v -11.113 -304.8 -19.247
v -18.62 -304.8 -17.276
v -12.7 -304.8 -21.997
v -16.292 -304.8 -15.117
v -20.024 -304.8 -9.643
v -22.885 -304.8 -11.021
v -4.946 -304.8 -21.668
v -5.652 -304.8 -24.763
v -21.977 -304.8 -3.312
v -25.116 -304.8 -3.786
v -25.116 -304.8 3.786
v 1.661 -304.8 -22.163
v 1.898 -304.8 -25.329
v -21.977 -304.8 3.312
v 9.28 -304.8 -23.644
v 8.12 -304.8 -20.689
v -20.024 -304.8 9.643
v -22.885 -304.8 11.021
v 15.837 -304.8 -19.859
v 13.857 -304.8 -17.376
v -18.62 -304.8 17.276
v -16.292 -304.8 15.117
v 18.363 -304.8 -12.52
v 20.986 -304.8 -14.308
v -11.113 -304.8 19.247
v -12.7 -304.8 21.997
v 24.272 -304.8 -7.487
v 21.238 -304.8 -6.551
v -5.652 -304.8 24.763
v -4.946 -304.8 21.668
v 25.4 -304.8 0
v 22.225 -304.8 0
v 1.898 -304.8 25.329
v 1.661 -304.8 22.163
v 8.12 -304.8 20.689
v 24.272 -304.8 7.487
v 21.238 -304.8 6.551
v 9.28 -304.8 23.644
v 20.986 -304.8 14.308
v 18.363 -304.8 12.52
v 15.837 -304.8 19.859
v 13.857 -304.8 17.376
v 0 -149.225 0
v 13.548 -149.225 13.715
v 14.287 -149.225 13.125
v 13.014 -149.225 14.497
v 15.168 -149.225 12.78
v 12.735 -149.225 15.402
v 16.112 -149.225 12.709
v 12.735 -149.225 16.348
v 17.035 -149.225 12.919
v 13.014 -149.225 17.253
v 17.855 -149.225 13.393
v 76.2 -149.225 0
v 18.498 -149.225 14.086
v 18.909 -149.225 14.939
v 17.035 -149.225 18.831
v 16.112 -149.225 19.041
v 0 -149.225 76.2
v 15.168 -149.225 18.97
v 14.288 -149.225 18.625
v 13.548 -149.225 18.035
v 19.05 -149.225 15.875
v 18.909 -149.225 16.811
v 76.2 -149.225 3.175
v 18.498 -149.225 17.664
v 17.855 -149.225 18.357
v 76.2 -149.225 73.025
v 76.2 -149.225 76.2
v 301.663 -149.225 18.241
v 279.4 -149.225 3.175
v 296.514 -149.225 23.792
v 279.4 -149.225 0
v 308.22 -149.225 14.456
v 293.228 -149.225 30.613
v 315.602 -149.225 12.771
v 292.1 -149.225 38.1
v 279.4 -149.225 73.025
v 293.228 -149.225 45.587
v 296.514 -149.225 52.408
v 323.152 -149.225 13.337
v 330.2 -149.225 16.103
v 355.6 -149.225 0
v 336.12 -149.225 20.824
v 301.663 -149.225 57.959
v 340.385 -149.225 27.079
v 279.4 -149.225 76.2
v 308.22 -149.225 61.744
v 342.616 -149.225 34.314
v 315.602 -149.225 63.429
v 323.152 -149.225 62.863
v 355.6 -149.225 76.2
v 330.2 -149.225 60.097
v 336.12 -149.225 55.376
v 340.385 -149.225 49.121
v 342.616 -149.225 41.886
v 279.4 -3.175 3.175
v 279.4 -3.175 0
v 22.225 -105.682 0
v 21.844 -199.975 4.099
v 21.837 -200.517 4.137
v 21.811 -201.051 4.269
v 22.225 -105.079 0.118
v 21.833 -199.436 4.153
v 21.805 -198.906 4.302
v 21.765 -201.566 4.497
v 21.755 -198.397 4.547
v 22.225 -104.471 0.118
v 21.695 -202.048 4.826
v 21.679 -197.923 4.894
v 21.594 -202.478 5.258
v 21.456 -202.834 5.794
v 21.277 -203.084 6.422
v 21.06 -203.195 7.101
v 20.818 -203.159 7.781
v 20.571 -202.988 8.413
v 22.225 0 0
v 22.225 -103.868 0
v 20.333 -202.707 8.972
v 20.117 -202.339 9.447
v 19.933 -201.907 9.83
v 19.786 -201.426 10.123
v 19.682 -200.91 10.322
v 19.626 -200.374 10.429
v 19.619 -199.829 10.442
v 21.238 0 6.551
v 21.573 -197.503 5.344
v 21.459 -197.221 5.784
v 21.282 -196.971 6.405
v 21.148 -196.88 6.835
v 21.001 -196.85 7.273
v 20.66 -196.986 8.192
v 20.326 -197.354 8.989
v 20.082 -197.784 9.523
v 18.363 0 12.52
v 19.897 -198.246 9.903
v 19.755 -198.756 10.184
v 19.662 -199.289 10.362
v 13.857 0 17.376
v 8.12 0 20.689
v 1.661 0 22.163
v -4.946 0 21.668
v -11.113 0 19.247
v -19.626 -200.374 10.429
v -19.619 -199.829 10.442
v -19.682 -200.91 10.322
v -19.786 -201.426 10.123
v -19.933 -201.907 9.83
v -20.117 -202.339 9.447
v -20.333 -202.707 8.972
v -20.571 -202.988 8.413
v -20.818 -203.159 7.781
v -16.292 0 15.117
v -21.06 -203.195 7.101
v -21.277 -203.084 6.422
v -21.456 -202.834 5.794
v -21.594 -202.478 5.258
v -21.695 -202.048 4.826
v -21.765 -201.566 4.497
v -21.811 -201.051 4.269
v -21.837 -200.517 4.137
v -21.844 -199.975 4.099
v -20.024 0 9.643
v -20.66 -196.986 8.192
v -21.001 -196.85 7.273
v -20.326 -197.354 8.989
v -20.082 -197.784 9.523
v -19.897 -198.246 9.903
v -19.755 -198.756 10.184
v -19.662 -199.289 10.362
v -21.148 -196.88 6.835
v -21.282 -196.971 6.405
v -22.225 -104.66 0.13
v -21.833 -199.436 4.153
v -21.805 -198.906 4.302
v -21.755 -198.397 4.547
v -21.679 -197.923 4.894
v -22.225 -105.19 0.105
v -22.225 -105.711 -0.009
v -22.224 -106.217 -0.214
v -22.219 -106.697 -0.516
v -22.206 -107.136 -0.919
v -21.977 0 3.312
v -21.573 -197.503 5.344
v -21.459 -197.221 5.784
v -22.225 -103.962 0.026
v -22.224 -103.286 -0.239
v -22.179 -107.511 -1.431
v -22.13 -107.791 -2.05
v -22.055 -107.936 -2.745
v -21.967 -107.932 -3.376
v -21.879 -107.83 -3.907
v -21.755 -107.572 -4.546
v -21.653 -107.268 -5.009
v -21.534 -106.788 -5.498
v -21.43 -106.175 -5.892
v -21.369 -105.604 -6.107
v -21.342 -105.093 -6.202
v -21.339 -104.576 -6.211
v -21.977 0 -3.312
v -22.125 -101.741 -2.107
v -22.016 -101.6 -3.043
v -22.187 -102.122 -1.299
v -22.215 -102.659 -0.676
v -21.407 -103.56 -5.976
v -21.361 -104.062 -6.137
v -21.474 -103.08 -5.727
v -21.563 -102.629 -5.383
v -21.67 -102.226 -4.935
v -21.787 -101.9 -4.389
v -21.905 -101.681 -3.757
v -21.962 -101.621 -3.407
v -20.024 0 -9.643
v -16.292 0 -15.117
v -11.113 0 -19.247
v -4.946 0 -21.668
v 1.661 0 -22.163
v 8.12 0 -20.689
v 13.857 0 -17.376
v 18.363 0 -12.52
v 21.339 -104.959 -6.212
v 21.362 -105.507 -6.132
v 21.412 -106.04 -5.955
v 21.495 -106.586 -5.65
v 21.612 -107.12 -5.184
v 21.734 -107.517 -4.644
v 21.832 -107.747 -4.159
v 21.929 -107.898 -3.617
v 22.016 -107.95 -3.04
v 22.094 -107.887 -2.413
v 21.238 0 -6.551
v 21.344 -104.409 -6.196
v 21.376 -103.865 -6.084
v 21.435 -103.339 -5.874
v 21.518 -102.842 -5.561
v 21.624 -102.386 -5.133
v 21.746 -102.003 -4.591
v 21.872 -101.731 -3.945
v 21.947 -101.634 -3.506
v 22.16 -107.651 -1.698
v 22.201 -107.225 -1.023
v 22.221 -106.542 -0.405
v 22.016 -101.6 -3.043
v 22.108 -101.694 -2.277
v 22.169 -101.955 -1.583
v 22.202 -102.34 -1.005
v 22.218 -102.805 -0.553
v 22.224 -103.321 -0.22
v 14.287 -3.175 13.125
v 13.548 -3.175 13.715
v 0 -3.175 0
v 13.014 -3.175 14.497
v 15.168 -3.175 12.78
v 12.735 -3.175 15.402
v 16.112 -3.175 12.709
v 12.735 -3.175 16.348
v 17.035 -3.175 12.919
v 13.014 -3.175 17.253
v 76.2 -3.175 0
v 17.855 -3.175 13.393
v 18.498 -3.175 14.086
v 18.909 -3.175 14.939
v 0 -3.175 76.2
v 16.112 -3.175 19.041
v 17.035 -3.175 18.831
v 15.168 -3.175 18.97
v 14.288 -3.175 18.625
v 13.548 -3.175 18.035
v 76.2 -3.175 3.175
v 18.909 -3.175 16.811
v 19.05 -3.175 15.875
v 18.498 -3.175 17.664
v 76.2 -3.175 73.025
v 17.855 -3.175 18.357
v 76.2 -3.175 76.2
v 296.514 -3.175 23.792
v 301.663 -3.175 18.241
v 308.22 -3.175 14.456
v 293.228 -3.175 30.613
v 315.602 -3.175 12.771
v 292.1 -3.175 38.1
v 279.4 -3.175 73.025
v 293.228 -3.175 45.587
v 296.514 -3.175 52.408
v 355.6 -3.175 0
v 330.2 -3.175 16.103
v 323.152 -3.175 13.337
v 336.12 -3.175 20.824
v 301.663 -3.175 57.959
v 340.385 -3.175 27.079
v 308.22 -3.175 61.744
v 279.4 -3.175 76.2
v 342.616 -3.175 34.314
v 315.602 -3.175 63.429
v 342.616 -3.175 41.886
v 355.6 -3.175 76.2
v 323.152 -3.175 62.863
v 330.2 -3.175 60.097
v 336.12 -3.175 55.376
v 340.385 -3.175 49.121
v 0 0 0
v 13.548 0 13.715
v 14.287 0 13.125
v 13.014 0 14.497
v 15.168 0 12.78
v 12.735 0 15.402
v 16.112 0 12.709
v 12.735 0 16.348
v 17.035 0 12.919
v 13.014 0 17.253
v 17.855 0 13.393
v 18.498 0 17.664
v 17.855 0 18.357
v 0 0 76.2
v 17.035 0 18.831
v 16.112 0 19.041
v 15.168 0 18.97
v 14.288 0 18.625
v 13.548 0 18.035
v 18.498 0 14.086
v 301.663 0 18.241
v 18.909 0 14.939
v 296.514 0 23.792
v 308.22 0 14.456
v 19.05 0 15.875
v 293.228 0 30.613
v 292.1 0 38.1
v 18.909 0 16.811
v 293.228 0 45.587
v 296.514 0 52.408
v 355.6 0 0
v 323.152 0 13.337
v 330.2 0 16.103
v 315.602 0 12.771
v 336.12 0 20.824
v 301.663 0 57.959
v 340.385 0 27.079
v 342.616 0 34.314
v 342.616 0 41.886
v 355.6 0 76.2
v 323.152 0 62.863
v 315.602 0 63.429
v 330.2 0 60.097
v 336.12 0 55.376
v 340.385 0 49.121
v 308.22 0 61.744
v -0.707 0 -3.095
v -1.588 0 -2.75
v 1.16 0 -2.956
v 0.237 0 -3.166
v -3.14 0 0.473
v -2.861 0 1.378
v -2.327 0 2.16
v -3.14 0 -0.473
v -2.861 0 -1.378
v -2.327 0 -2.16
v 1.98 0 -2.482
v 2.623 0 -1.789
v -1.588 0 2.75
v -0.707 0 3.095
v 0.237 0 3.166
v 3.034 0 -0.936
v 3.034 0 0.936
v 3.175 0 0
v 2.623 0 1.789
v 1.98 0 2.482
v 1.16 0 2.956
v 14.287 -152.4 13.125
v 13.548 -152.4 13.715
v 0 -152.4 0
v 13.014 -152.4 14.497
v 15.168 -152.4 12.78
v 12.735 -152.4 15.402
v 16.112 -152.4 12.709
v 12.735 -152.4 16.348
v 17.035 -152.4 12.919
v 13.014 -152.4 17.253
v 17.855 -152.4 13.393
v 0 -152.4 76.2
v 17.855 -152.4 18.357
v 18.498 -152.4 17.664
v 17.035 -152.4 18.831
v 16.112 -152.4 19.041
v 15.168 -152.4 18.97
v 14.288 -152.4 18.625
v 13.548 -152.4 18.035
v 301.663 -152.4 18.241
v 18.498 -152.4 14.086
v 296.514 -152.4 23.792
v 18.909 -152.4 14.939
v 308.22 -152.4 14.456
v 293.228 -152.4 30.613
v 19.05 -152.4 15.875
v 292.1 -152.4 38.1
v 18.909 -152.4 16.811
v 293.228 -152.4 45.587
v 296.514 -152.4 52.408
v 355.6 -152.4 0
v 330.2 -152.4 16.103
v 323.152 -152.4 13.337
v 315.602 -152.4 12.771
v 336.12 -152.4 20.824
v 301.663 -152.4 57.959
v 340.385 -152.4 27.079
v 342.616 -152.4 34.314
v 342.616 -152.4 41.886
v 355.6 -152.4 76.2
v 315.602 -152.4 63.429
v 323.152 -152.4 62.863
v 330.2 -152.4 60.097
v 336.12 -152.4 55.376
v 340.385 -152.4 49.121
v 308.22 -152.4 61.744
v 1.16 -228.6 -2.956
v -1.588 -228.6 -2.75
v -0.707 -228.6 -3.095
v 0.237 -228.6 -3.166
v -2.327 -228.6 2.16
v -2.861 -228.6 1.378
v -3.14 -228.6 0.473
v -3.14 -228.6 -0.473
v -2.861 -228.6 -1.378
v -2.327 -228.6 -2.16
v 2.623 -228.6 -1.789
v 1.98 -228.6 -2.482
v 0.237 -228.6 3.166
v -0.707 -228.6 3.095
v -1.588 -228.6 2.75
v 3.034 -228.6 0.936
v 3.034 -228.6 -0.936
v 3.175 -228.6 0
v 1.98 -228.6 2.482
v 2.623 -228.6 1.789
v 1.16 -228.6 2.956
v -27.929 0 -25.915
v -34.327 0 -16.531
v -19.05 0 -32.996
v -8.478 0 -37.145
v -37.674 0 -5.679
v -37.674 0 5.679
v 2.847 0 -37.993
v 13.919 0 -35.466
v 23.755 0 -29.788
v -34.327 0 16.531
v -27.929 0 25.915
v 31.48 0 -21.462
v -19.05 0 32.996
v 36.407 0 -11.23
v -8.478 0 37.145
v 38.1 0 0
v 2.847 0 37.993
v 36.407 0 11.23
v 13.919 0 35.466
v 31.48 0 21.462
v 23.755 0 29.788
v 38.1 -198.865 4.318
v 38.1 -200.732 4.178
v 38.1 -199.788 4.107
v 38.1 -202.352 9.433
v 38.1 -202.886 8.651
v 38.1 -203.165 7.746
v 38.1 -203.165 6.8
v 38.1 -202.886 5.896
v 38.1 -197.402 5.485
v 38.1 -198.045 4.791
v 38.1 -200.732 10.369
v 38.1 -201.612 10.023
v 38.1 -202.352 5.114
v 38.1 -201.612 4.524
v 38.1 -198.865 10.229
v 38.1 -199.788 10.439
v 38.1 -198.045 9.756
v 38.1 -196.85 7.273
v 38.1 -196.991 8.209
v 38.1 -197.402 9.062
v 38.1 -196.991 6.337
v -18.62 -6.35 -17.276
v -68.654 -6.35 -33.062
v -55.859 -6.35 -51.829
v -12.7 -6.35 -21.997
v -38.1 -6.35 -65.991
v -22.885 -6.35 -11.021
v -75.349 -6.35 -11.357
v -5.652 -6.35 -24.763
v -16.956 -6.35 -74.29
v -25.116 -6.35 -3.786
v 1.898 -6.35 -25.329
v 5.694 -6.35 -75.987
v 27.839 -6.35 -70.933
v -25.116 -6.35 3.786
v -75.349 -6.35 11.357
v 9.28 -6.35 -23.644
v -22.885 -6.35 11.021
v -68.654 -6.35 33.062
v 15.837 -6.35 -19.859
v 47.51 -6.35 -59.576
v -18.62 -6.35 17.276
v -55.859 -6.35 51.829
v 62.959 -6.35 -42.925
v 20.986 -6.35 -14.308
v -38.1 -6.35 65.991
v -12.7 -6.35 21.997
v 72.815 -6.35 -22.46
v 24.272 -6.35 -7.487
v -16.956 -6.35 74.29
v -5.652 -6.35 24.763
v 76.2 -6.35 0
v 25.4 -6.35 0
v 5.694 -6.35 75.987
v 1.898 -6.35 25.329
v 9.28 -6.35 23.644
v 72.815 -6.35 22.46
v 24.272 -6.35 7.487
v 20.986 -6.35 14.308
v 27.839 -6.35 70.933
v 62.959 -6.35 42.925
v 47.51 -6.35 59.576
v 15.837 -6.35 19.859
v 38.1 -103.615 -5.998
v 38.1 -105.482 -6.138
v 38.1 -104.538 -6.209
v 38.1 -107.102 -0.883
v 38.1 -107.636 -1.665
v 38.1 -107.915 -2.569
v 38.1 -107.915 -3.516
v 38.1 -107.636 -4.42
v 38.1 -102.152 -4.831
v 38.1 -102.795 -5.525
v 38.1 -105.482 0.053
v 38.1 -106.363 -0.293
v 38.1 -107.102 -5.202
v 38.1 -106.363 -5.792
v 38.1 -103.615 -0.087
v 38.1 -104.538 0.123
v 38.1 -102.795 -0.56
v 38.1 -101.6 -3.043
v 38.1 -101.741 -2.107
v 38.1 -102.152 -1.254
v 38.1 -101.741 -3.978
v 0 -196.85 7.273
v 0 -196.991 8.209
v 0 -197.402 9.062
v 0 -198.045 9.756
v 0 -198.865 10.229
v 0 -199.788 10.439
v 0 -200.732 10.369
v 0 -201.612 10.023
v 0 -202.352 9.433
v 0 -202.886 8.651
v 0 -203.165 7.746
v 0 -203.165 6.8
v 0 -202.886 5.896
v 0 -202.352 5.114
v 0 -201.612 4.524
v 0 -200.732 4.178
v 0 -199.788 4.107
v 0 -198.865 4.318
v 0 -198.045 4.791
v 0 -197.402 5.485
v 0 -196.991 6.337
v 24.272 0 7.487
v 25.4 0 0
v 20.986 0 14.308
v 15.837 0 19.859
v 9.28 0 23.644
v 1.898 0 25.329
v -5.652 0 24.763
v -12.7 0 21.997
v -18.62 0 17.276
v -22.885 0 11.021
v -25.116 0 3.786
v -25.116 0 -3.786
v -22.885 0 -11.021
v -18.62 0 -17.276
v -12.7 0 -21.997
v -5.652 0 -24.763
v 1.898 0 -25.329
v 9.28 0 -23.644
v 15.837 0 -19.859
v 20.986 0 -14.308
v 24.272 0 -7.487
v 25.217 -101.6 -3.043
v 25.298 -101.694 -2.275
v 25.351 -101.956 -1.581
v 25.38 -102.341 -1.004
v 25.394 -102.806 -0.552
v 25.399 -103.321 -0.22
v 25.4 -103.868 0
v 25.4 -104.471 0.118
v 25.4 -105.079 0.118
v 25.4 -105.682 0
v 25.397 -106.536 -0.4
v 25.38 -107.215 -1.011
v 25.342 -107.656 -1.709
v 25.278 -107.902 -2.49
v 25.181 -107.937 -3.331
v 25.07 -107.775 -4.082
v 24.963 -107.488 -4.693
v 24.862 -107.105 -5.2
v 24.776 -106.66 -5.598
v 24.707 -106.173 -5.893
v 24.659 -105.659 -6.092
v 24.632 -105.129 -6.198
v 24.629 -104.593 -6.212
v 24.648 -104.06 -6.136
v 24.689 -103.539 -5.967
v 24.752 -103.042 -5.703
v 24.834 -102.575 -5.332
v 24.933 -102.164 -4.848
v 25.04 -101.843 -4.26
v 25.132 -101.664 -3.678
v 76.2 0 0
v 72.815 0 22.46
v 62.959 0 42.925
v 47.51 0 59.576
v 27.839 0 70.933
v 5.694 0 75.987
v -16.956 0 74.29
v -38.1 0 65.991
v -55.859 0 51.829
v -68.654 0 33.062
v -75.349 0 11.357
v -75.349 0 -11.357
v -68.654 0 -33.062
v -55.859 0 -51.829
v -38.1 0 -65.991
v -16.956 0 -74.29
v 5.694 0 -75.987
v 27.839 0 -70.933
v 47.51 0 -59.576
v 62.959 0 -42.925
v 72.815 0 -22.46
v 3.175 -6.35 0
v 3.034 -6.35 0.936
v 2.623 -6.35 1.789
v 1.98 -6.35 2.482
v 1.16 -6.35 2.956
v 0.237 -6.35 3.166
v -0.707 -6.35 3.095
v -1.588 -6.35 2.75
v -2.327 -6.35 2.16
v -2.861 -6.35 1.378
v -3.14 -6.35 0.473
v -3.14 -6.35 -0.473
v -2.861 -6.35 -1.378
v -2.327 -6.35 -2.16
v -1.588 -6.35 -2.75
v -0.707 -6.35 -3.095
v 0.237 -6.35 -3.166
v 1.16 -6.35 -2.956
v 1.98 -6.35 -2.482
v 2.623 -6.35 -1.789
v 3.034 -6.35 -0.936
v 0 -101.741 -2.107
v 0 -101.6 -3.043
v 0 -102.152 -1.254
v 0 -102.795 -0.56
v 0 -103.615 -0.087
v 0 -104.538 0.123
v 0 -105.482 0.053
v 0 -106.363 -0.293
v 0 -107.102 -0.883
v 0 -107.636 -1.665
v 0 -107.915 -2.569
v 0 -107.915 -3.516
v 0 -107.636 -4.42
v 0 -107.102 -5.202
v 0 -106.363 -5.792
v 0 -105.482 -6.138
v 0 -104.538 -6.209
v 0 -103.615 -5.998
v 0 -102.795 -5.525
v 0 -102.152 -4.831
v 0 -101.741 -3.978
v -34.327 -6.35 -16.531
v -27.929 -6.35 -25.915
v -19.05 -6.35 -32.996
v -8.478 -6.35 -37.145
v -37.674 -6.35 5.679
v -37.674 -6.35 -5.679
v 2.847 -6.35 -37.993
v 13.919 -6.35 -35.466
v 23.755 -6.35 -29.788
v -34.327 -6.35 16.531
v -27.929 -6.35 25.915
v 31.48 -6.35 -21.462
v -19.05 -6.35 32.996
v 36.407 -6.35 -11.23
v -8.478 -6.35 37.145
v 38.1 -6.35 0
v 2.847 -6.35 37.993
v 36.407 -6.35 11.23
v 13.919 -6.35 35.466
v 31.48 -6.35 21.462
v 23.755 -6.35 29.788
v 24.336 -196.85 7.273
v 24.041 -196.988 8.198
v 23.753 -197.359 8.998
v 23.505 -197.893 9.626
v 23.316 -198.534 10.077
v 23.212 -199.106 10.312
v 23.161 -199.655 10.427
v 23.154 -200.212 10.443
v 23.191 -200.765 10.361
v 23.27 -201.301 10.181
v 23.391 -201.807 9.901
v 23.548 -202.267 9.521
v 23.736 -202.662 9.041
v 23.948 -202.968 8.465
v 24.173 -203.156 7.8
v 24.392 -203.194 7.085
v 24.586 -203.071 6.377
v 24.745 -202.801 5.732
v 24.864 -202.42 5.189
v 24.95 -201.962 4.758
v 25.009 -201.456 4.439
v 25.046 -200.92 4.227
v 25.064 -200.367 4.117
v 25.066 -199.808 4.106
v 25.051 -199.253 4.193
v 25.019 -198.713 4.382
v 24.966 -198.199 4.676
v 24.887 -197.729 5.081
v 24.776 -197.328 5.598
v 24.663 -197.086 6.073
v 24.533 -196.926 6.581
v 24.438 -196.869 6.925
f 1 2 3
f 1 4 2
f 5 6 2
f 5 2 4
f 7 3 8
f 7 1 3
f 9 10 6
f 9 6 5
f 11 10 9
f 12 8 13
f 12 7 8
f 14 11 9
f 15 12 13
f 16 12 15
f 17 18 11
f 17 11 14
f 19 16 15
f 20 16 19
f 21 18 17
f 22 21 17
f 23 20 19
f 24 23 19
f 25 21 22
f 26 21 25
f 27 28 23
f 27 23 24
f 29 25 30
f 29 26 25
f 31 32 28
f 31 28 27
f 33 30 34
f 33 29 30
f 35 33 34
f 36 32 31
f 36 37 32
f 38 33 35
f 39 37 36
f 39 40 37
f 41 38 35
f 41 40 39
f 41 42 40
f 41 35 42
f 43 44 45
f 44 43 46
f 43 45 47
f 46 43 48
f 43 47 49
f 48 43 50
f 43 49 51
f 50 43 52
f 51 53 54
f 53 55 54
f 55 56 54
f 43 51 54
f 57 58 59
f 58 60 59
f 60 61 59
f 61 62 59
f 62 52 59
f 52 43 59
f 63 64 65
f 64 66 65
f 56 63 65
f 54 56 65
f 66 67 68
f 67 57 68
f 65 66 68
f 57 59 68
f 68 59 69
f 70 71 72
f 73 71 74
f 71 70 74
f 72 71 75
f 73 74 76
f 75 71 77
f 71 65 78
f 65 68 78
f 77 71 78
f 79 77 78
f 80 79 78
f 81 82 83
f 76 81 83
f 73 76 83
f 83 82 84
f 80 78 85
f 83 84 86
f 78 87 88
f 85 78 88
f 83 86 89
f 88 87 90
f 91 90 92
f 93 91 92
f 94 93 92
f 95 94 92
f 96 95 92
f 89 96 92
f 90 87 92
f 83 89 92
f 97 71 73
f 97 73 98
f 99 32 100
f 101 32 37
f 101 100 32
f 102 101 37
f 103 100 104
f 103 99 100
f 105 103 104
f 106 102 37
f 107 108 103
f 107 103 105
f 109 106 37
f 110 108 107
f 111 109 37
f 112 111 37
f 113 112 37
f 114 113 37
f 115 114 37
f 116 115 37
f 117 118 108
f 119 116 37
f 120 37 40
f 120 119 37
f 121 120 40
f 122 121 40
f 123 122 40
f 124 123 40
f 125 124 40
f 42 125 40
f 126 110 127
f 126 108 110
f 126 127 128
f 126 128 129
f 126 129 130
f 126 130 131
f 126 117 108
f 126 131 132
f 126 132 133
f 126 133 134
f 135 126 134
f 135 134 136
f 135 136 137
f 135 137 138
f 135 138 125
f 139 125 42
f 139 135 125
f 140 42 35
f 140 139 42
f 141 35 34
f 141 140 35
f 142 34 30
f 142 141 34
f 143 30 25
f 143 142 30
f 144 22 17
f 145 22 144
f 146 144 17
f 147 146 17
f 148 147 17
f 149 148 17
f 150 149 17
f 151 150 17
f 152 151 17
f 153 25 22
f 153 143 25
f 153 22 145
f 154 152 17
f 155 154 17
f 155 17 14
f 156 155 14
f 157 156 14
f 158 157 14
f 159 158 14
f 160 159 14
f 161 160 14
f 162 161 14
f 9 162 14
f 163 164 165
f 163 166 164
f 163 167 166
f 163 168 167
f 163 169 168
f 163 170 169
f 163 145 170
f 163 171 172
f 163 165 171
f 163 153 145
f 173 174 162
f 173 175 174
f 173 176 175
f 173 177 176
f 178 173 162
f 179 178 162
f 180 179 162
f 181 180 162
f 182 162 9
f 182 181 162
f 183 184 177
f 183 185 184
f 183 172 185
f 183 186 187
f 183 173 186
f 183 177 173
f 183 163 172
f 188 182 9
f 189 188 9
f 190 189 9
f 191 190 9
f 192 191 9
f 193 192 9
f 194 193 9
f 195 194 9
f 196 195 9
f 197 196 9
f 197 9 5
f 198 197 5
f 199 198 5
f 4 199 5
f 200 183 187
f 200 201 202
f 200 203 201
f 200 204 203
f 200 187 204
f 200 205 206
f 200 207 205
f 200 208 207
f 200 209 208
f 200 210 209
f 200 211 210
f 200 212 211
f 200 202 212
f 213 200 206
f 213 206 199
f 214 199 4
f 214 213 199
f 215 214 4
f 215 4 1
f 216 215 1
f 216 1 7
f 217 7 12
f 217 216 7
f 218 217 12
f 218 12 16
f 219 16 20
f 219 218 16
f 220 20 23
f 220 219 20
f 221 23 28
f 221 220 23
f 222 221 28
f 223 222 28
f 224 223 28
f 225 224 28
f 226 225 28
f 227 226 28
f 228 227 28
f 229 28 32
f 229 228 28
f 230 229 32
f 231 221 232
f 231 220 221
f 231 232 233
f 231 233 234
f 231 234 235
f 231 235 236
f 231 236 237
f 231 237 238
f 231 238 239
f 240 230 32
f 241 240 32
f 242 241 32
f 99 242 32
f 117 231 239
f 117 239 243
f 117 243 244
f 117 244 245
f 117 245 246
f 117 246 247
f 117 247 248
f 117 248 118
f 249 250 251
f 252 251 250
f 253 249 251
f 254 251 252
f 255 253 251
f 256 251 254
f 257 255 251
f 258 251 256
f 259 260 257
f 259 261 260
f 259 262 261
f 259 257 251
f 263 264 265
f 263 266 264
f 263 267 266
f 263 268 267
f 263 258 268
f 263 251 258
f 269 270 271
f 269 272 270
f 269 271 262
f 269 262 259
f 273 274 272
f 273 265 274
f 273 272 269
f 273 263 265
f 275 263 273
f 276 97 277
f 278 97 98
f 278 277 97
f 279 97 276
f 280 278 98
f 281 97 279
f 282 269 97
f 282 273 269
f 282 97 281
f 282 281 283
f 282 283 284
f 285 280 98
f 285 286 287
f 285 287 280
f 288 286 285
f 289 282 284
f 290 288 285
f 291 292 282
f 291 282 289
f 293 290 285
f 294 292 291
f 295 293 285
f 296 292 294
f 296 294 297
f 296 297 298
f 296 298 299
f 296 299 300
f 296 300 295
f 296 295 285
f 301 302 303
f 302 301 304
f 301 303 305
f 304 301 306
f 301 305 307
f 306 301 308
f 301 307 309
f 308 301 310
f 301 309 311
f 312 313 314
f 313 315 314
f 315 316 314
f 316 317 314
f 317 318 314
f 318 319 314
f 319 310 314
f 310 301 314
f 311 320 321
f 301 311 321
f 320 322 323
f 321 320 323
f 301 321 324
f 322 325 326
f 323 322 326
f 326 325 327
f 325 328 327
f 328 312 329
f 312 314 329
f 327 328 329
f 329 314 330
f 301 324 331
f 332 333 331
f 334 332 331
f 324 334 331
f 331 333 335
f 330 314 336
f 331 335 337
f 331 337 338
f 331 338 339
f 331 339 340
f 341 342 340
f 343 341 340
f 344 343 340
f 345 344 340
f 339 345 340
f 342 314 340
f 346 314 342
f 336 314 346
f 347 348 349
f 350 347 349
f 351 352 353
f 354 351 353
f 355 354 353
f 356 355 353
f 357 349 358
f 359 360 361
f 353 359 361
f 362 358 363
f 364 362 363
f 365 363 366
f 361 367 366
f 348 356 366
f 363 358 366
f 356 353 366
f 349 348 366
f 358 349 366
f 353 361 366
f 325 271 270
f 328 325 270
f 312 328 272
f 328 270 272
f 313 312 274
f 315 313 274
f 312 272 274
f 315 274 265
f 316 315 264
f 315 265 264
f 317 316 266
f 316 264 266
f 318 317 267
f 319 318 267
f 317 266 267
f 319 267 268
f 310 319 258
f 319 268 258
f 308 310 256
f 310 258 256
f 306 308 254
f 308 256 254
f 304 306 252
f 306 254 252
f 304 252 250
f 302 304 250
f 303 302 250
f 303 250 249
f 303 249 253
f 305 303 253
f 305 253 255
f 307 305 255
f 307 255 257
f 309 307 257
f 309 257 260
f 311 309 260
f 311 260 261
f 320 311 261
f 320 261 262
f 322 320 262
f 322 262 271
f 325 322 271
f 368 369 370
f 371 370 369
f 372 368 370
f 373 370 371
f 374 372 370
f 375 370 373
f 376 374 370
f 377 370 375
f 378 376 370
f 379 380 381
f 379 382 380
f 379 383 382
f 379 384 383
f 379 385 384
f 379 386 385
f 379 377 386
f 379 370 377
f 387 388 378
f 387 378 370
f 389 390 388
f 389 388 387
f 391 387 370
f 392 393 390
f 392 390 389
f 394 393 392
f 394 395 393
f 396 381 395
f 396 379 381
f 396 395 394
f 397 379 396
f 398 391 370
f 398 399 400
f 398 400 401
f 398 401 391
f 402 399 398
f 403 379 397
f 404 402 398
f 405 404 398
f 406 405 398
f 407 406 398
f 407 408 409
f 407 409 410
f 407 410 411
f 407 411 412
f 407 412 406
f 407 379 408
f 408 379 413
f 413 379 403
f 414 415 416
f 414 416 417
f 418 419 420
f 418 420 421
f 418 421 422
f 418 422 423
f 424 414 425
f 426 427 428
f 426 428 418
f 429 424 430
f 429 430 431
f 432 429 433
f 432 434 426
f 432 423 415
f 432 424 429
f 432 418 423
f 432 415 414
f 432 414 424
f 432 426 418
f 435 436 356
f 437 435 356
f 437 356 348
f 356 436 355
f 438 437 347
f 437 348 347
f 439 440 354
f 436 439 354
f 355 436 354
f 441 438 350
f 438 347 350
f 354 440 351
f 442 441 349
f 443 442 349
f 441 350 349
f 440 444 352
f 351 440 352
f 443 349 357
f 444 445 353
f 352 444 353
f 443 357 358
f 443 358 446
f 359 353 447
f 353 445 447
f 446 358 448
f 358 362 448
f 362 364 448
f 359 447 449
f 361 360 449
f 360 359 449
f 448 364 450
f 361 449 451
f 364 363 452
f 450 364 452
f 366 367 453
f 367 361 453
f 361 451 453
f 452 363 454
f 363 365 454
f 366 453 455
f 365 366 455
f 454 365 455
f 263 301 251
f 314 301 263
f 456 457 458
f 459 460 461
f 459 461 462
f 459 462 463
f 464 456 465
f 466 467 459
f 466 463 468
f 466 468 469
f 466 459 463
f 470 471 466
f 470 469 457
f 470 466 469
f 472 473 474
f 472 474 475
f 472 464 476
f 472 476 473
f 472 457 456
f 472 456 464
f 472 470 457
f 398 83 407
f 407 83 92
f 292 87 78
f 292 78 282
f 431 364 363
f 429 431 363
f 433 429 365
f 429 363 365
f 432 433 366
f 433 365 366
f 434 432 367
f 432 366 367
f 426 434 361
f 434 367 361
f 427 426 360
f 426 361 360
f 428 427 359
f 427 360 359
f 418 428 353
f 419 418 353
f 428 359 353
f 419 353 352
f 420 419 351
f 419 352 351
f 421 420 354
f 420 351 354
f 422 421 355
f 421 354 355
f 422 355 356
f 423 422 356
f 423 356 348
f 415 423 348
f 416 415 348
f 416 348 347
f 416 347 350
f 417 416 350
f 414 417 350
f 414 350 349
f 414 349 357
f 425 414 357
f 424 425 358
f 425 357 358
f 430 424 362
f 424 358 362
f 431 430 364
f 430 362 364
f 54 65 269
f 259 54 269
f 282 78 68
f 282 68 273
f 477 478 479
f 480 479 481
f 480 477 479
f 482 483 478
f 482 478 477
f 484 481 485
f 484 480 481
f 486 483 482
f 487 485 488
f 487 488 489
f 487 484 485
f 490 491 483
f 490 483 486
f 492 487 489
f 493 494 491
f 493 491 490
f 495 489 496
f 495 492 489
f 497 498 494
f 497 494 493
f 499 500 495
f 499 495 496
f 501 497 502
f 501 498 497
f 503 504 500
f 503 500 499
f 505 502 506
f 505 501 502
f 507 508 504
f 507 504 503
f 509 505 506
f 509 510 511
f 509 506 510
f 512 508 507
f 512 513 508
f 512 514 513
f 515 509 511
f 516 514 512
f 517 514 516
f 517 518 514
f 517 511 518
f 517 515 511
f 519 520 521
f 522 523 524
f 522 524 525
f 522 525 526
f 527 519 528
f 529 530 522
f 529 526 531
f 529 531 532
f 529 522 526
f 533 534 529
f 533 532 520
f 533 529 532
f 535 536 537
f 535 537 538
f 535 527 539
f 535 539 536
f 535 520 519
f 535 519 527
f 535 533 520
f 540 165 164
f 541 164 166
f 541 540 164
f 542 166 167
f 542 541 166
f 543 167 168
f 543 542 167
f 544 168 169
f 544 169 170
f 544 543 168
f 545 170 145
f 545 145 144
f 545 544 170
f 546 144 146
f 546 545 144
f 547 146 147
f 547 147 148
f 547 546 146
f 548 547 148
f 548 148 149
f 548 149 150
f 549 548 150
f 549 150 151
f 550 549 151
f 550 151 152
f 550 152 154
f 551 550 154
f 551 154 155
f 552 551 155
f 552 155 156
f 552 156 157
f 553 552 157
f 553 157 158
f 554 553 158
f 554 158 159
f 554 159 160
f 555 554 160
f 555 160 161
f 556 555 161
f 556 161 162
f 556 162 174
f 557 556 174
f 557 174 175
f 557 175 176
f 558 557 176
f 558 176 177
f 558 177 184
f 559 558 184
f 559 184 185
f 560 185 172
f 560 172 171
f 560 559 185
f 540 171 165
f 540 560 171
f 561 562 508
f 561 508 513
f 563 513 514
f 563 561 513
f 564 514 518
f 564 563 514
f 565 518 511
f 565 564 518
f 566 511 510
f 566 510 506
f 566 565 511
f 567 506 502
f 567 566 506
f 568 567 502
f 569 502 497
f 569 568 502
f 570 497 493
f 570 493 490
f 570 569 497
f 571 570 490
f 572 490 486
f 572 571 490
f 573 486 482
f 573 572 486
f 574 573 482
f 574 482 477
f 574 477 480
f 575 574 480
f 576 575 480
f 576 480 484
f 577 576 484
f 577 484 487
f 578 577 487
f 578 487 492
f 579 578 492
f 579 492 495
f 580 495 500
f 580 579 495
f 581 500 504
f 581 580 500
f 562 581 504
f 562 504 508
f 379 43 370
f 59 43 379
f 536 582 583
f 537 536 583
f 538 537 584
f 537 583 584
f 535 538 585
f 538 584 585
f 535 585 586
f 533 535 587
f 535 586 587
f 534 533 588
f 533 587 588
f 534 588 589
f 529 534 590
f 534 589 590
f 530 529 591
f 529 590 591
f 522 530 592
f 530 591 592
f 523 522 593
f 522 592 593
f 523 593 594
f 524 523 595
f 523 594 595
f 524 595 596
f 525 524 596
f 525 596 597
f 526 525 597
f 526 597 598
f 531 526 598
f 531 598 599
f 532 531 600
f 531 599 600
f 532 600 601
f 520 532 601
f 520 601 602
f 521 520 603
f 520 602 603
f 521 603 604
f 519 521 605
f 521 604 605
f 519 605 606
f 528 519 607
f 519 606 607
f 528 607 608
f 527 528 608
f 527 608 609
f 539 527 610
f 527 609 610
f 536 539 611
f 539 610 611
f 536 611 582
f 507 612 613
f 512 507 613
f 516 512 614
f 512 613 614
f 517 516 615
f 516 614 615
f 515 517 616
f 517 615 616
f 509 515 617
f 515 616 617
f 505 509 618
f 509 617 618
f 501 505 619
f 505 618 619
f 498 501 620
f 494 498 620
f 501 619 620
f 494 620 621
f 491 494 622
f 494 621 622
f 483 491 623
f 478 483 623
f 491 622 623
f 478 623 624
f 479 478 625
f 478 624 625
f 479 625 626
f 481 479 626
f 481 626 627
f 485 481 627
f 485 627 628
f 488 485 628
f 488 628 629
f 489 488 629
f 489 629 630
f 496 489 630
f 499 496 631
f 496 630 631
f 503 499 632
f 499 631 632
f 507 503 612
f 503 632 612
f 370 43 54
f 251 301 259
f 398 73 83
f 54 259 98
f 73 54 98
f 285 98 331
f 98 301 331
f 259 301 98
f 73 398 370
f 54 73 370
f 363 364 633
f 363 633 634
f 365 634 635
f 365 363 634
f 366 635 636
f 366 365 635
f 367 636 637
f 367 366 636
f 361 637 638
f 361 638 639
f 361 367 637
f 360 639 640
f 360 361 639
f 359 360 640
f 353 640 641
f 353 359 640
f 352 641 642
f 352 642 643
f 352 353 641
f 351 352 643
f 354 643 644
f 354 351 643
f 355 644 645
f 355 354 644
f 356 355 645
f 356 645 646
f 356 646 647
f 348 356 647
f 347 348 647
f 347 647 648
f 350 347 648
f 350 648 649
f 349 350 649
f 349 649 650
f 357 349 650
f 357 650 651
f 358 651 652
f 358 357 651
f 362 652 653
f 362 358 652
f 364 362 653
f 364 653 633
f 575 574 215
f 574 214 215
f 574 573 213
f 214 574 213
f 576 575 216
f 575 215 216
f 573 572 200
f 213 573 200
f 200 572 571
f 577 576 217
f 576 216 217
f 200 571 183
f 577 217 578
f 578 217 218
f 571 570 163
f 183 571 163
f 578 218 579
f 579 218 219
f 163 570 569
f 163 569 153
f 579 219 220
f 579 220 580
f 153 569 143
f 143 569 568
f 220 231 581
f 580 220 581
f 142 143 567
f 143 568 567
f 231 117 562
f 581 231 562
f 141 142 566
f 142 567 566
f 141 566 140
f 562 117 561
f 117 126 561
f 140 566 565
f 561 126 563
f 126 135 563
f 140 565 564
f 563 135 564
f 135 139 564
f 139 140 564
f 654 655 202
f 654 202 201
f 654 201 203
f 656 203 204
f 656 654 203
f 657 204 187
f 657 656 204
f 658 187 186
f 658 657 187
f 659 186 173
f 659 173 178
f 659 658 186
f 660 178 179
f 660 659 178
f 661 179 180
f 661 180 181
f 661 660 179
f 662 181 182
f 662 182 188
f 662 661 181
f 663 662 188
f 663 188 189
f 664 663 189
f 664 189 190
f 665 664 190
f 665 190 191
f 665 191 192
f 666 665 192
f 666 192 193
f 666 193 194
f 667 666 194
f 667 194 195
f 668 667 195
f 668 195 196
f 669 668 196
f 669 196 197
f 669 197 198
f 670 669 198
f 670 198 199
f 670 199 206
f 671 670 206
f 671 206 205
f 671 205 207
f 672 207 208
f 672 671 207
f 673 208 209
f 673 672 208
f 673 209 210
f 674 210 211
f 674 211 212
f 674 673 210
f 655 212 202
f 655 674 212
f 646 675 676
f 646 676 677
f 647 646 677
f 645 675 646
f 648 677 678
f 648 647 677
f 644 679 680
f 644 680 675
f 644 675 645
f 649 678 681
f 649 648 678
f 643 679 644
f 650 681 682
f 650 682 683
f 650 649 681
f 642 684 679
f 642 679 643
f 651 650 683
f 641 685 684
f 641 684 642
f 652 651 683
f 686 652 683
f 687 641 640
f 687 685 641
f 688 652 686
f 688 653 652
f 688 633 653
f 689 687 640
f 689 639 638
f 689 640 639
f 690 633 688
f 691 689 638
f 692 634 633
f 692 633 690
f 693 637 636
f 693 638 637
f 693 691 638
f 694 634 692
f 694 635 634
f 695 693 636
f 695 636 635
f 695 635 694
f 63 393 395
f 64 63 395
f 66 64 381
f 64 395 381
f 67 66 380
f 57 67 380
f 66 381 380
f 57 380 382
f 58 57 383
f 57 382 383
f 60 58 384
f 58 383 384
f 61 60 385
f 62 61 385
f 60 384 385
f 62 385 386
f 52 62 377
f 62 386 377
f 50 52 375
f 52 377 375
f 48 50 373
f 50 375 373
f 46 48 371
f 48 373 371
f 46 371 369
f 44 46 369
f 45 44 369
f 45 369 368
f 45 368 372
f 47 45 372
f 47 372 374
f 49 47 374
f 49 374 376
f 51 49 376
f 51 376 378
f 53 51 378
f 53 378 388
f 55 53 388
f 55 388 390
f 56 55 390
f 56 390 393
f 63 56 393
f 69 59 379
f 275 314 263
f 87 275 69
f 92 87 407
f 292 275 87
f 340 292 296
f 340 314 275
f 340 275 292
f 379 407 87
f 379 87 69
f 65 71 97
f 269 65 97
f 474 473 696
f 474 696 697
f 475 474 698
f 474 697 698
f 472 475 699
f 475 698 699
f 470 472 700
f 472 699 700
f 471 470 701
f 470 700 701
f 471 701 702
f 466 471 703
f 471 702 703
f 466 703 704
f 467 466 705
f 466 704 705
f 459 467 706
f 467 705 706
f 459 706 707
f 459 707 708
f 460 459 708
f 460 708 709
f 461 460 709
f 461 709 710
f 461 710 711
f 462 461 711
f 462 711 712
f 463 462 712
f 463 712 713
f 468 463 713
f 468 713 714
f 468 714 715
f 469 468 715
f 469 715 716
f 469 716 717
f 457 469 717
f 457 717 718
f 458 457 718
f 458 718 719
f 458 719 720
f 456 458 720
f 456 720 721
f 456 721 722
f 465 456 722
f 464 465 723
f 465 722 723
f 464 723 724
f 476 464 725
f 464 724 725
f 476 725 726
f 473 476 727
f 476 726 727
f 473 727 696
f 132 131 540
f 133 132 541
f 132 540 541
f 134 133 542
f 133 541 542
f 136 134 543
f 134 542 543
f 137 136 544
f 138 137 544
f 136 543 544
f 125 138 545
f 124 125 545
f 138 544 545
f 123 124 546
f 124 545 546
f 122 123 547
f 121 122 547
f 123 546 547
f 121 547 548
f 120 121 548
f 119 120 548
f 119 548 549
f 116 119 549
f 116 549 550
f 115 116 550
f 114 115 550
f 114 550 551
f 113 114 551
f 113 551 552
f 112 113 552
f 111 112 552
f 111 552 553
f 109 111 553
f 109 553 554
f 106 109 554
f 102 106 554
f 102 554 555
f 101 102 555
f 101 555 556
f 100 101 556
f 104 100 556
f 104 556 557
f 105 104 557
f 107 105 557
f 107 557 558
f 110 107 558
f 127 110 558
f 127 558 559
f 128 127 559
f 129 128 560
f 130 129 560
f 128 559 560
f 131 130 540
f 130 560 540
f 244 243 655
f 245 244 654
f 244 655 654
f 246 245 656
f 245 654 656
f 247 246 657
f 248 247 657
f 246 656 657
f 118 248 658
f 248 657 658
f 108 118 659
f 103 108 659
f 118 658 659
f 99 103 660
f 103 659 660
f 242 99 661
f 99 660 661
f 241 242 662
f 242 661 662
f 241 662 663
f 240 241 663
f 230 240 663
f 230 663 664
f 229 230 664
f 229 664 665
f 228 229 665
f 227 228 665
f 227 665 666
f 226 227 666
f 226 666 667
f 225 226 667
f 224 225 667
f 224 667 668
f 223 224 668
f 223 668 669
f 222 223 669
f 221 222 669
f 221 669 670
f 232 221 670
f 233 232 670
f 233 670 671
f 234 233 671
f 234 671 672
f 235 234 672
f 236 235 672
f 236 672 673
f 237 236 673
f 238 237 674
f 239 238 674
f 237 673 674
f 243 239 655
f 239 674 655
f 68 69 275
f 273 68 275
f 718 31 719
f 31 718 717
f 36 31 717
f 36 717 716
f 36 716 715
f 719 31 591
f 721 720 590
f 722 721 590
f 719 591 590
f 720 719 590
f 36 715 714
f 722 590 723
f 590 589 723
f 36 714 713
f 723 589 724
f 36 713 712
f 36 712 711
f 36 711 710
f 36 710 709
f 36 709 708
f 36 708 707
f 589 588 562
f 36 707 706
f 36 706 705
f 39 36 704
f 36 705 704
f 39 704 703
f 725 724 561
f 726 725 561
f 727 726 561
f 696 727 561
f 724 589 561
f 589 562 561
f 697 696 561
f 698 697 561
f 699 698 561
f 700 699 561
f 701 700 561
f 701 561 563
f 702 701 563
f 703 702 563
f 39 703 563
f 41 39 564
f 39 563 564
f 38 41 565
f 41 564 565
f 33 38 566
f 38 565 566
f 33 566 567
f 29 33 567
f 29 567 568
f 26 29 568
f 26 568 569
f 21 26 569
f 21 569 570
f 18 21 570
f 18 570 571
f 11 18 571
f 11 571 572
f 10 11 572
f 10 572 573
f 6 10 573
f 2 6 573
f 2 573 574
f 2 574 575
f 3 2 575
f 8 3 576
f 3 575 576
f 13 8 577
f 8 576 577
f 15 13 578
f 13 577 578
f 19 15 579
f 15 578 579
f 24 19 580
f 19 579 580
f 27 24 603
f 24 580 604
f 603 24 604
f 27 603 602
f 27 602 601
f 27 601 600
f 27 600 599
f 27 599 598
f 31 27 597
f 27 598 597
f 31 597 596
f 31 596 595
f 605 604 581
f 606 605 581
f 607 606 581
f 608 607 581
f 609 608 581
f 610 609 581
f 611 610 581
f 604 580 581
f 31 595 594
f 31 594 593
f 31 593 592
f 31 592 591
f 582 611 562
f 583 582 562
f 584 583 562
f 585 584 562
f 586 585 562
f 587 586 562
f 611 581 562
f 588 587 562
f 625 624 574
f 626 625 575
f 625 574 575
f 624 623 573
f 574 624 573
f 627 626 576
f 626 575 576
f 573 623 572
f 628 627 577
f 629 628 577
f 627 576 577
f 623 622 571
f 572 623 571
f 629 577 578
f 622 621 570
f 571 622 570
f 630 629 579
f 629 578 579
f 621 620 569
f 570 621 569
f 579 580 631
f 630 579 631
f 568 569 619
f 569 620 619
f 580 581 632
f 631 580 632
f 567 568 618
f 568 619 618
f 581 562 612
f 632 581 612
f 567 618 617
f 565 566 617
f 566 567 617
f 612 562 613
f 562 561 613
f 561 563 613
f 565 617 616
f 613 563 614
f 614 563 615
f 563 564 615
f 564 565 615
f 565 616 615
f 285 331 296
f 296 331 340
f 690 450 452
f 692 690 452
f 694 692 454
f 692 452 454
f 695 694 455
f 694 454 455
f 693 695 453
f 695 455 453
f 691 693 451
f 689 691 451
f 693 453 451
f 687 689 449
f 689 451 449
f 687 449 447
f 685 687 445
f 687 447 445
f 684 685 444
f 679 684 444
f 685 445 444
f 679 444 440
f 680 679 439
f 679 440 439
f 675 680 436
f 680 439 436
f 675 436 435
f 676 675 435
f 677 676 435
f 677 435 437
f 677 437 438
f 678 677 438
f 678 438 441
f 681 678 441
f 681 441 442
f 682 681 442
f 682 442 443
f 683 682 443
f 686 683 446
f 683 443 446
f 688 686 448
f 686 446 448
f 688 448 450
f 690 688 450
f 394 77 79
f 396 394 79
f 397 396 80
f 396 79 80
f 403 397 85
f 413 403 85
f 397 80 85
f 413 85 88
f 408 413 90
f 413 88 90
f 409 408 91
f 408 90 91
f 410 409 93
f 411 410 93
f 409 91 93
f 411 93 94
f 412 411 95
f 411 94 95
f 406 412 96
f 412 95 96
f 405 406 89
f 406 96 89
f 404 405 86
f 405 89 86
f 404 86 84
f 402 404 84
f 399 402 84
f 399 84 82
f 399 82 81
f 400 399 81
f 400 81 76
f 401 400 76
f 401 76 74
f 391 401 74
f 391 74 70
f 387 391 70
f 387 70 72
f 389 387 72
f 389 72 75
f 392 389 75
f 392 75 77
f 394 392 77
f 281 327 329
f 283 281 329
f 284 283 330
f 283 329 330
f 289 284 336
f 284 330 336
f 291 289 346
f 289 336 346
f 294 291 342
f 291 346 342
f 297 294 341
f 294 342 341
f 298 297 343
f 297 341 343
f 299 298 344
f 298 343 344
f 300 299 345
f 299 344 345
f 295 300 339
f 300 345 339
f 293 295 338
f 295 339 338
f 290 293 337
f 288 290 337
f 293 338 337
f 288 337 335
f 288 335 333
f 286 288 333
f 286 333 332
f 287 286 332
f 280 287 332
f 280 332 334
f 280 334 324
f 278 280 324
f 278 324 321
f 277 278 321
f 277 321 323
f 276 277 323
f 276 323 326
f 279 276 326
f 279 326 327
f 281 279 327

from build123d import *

# Parameters (mm, degrees)
F0_R          = 38.1
F0_R_2        = 3.175
F1_DEPTH      = 6.35
F2_R          = 25.4
F2_R_2        = 22.225
F3_DEPTH      = 304.8
F4_R          = 3.175
F5_DEPTH      = 38.1
F5_DEPTH_BACK = 22.3250001344
F6_W          = 355.6
F6_H          = 76.2
F7_DEPTH      = 152.4
F8_W          = 76.2
F8_H          = 146.05
F9_DEPTH      = 114.301
F10_W         = 146.05
F10_H         = 69.85
F11_DEPTH     = 317.501
F12_R         = 25.4
F13_DEPTH     = 304.8010001
F14_R         = 3.175
F15_DEPTH     = 152.4010001
F16_R         = 76.2
F16_R_2       = 25.4
F17_DEPTH     = 6.35
F18_R         = 3.175
F19_DEPTH     = 228.6


with BuildPart() as f1:
    # F0 (on Front) → F1 (new body)
    with BuildSketch(Plane.XZ):
        Circle(F0_R)
        Circle(F0_R_2, mode=Mode.SUBTRACT)
    extrude(amount=F1_DEPTH)


with BuildPart() as f3:
    # F2 (on Front) → F3 (new body)
    with BuildSketch(Plane.XZ):
        Circle(F2_R)
        Circle(F2_R_2, mode=Mode.SUBTRACT)
    extrude(amount=F3_DEPTH)

    # F4 (on Right) → F5 (join, two sides)
    with BuildSketch(Plane.YZ) as f5_sk:
        with Locations((-200.025, 7.2732745194)):
            Circle(F4_R)
        with Locations((-104.775, -3.0426453606)):
            Circle(F4_R)
    extrude(amount=F5_DEPTH)
    extrude(f5_sk.sketch, amount=-F5_DEPTH_BACK)


with BuildPart() as f7:
    # F6 (on Front) → F7 (new body)
    with BuildSketch(Plane.XZ):
        with Locations((177.8, 38.1)):
            Rectangle(F6_W, F6_H)
    extrude(amount=F7_DEPTH)

    # F8 (on face) → F9 (cut, through all)
    with BuildSketch(Plane.XY.offset(76.2)):
        with Locations((38.1, -76.2)):
            Rectangle(F8_W, F8_H)
        with Locations((317.5, -76.2)):
            Rectangle(F8_W, F8_H)
    extrude(amount=-F9_DEPTH, mode=Mode.SUBTRACT)

    # F10 (on face) → F11 (cut, through all)
    with BuildSketch(Plane.YZ.offset(279.4)):
        with Locations((-76.2, 38.1)):
            Rectangle(F10_W, F10_H)
    extrude(amount=-F11_DEPTH, mode=Mode.SUBTRACT)

    # F12 (on face) → F13 (cut, through all)
    with BuildSketch(Plane(origin=(0, 0, 0), x_dir=(-1, 0, 0), z_dir=(0, 1, 0))):
        with Locations((-317.5, 38.1)):
            Circle(F12_R)
    extrude(amount=-F13_DEPTH, mode=Mode.SUBTRACT)

    # F14 (on face) → F15 (cut, through all)
    with BuildSketch(Plane.XZ.offset(152.4)):
        with Locations((15.875, 15.875)):
            Circle(F14_R)
    extrude(amount=-F15_DEPTH, mode=Mode.SUBTRACT)


with BuildPart() as f17:
    # F16 (on Front) → F17 (new body)
    with BuildSketch(Plane.XZ):
        Circle(F16_R)
        Circle(F16_R_2, mode=Mode.SUBTRACT)
    extrude(amount=F17_DEPTH)


with BuildPart() as f19:
    # F18 (on Front) → F19 (new body)
    with BuildSketch(Plane.XZ):
        Circle(F18_R)
    extrude(amount=F19_DEPTH)


solid = Compound([f1.part, f3.part, f7.part, f17.part, f19.part])
